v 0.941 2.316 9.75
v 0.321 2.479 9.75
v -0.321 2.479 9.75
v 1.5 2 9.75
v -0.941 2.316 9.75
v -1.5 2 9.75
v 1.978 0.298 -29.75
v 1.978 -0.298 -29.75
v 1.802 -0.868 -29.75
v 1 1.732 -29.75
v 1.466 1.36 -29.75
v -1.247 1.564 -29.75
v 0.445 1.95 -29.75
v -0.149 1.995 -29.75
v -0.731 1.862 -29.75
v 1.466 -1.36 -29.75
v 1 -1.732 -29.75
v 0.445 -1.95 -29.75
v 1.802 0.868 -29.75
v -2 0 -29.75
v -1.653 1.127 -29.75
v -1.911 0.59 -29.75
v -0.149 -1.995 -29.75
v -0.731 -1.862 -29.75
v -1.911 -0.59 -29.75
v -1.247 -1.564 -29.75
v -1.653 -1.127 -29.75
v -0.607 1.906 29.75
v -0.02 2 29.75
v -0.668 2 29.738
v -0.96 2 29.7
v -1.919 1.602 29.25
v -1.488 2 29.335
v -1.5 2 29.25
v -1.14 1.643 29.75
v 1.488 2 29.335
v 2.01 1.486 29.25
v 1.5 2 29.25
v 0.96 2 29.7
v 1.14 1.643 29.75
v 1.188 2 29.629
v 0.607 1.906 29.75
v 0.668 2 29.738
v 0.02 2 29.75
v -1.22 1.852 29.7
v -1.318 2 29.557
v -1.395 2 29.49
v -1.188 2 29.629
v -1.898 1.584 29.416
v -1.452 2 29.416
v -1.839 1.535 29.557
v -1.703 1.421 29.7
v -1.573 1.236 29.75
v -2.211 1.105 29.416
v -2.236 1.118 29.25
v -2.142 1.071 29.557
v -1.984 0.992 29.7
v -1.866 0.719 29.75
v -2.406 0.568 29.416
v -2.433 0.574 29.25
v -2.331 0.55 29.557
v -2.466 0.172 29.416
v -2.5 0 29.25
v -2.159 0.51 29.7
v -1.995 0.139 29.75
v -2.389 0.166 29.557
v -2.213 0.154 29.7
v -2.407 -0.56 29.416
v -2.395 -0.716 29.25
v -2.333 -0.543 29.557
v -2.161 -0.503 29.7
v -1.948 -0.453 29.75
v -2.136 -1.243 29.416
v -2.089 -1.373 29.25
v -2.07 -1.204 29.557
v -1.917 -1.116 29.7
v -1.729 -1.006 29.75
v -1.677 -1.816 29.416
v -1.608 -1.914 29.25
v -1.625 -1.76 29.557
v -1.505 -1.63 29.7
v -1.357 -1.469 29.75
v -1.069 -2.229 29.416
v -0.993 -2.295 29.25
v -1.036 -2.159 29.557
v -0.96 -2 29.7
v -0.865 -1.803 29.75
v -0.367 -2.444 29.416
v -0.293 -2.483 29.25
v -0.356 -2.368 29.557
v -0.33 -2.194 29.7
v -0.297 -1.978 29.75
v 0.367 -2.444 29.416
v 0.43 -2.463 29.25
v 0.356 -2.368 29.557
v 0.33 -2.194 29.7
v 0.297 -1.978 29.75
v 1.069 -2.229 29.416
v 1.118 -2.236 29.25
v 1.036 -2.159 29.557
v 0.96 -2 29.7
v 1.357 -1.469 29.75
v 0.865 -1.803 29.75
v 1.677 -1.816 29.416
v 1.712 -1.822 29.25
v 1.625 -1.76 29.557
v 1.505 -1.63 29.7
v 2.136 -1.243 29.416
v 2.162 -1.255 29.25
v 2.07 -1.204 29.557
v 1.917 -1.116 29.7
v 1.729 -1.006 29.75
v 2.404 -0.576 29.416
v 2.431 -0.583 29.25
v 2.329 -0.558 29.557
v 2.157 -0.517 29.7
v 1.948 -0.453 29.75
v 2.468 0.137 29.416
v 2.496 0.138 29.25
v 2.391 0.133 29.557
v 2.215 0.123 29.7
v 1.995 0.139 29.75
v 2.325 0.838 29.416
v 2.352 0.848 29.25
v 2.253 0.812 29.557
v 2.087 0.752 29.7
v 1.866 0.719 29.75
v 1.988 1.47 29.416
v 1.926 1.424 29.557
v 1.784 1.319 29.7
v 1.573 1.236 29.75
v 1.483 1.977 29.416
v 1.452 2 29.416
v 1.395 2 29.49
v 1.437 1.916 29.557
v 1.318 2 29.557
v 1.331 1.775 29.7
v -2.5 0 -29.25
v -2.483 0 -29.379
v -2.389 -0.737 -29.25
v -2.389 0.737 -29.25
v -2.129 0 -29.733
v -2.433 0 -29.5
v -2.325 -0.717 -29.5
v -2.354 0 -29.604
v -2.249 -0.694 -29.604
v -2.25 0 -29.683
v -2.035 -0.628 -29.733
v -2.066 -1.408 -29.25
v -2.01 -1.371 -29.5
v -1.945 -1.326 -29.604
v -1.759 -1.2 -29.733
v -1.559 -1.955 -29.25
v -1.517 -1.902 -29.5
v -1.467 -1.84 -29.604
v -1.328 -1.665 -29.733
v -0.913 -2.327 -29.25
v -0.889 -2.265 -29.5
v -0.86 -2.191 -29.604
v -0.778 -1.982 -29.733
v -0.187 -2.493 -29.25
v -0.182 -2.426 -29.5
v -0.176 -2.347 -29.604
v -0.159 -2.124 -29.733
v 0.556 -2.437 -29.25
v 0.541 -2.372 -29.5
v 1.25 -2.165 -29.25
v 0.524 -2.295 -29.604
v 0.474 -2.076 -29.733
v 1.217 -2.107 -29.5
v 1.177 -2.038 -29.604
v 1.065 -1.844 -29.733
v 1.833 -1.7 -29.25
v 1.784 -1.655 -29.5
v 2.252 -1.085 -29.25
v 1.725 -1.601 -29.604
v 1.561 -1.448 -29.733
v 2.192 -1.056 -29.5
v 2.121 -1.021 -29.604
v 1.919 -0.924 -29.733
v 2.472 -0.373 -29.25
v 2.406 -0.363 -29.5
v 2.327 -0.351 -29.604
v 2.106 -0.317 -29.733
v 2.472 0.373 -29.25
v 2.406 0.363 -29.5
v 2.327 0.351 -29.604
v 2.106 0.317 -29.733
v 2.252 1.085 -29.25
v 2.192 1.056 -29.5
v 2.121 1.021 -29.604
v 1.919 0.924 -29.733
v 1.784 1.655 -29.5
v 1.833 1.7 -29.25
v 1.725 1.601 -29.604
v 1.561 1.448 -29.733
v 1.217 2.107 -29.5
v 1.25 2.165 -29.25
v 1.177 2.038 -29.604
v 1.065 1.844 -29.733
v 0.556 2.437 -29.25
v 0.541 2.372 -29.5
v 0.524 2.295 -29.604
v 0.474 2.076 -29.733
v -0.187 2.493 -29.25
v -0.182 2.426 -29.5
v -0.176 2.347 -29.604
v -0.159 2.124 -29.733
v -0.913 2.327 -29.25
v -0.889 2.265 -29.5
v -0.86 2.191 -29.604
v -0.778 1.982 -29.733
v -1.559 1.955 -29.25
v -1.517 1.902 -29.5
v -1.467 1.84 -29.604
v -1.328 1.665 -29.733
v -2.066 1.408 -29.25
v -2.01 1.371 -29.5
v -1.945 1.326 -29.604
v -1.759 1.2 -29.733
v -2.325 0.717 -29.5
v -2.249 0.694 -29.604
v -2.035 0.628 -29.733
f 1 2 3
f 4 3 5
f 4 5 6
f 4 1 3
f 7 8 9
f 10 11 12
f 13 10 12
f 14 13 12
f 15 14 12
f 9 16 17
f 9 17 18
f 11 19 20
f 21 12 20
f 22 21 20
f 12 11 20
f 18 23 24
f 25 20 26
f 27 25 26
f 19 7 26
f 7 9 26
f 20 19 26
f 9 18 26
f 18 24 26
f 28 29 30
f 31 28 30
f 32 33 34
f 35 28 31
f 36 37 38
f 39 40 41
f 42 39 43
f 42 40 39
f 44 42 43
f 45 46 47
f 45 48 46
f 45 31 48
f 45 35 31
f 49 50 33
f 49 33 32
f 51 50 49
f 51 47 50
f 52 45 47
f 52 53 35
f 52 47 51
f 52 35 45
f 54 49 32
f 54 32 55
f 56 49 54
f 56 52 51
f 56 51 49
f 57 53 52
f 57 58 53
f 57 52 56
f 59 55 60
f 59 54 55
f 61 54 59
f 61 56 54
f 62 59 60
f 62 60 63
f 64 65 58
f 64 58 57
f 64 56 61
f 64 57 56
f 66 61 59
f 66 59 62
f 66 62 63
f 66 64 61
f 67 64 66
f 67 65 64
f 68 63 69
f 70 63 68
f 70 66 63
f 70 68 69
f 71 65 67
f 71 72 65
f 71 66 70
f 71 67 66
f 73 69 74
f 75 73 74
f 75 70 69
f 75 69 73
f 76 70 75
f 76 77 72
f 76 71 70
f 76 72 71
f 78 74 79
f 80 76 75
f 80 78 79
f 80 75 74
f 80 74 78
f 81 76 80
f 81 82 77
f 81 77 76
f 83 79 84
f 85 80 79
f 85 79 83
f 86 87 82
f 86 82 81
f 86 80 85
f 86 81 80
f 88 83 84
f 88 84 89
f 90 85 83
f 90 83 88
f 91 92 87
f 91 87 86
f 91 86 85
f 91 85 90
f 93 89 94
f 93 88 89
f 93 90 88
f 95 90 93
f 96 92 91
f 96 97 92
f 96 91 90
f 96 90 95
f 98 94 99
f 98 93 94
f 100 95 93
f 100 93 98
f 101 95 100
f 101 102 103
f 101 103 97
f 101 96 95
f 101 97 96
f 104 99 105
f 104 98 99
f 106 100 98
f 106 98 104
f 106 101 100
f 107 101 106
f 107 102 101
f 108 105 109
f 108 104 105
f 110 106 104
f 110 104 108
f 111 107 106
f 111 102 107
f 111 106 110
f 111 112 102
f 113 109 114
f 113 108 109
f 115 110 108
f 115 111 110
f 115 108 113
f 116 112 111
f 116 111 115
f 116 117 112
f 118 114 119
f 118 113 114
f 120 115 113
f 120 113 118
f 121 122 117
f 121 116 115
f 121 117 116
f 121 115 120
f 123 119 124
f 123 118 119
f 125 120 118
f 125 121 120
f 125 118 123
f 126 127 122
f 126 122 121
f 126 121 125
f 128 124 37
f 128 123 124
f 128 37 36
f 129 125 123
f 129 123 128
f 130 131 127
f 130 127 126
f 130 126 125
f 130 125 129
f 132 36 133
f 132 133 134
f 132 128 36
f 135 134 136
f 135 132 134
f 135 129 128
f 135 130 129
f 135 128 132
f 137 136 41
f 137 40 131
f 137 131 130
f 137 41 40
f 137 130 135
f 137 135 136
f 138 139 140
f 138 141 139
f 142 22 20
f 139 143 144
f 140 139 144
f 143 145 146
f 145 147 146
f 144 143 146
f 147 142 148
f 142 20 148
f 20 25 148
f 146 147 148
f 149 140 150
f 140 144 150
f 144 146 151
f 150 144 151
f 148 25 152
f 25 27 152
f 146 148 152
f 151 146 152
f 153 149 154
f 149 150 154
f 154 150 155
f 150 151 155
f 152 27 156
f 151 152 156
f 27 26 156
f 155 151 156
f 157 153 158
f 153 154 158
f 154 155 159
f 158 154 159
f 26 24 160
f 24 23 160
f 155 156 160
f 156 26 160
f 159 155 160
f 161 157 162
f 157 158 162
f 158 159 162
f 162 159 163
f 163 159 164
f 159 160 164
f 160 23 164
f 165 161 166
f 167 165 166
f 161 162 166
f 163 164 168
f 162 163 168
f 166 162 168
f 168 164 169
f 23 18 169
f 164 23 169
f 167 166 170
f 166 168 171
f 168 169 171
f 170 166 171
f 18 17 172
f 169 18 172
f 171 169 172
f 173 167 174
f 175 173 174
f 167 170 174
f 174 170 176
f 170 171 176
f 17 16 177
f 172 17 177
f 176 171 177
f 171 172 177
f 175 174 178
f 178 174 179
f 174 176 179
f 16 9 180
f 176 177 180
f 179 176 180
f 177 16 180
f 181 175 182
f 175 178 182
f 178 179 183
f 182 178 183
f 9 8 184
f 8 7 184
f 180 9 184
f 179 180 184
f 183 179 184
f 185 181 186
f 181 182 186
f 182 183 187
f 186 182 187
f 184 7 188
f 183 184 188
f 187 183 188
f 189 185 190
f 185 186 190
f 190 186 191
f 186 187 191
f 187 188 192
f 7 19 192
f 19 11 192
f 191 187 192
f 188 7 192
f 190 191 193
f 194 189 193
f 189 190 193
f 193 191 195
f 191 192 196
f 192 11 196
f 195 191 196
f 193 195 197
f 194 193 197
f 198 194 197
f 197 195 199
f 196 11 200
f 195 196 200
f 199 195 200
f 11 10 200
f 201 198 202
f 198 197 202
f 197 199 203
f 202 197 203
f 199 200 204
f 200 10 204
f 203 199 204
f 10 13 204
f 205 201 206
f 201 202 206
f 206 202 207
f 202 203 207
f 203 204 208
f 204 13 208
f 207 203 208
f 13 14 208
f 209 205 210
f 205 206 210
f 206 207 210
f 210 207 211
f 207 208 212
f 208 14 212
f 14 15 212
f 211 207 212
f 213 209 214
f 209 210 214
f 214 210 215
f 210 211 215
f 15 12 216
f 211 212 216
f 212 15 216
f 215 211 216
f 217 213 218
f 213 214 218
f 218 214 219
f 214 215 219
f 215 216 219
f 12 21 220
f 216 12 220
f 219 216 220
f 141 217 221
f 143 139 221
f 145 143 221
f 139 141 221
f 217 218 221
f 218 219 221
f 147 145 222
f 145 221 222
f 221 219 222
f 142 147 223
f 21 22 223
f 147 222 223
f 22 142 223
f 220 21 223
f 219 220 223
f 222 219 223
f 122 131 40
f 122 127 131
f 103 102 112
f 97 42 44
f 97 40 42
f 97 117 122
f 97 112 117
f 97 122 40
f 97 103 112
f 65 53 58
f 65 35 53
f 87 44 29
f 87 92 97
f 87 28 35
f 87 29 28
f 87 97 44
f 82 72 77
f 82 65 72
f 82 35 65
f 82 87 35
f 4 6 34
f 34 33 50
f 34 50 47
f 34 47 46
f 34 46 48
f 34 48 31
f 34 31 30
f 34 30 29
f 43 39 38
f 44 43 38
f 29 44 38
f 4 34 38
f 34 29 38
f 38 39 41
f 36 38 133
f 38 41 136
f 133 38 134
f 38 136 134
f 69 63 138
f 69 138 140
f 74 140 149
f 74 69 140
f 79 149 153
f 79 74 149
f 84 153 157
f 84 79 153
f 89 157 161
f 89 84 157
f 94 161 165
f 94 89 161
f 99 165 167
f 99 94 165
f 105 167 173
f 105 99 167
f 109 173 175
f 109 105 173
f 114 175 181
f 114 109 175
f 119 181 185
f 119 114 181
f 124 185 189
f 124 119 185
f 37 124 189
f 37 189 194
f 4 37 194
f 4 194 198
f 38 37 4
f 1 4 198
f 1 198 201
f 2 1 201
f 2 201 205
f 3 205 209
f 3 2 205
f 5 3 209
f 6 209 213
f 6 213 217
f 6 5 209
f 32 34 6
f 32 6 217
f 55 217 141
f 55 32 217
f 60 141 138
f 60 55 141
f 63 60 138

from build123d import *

# Parameters (mm, degrees)
SKETCH1_R           = 2.5
BOSS_EXTRUDE1_DEPTH = 29.75
CUT_EXTRUDE2_DEPTH  = 20
FILLET1_R           = 0.5


with BuildPart() as part:
    # Sketch1 → Boss-Extrude1 (new, symmetric)
    with BuildSketch(Plane.XY):
        with Locations(Location((0, 0, 0), (0, 0, 180))):
            Circle(SKETCH1_R)
    extrude(amount=BOSS_EXTRUDE1_DEPTH, both=True)

    # Sketch2 → Cut-Extrude2 (cut)
    with BuildSketch(Plane.XY.offset(29.75)):
        with BuildLine():
            ThreePointArc((1.5, 2), (0, 2.5), (-1.5, 2))
            Line((-1.5, 2), (1.5, 2))
        make_face()
    extrude(amount=-CUT_EXTRUDE2_DEPTH, mode=Mode.SUBTRACT)

    # Fillet1
    fillet1_edges = [part.edges().sort_by_distance(p)[0] for p in [
        (2.5, 0, -29.75),
        (1.118033989, -2.236067977, 29.75),
    ]]
    fillet(fillet1_edges, radius=FILLET1_R - 0.0001)  # a hair under: the kernel refuses the full size


solid = part.part
